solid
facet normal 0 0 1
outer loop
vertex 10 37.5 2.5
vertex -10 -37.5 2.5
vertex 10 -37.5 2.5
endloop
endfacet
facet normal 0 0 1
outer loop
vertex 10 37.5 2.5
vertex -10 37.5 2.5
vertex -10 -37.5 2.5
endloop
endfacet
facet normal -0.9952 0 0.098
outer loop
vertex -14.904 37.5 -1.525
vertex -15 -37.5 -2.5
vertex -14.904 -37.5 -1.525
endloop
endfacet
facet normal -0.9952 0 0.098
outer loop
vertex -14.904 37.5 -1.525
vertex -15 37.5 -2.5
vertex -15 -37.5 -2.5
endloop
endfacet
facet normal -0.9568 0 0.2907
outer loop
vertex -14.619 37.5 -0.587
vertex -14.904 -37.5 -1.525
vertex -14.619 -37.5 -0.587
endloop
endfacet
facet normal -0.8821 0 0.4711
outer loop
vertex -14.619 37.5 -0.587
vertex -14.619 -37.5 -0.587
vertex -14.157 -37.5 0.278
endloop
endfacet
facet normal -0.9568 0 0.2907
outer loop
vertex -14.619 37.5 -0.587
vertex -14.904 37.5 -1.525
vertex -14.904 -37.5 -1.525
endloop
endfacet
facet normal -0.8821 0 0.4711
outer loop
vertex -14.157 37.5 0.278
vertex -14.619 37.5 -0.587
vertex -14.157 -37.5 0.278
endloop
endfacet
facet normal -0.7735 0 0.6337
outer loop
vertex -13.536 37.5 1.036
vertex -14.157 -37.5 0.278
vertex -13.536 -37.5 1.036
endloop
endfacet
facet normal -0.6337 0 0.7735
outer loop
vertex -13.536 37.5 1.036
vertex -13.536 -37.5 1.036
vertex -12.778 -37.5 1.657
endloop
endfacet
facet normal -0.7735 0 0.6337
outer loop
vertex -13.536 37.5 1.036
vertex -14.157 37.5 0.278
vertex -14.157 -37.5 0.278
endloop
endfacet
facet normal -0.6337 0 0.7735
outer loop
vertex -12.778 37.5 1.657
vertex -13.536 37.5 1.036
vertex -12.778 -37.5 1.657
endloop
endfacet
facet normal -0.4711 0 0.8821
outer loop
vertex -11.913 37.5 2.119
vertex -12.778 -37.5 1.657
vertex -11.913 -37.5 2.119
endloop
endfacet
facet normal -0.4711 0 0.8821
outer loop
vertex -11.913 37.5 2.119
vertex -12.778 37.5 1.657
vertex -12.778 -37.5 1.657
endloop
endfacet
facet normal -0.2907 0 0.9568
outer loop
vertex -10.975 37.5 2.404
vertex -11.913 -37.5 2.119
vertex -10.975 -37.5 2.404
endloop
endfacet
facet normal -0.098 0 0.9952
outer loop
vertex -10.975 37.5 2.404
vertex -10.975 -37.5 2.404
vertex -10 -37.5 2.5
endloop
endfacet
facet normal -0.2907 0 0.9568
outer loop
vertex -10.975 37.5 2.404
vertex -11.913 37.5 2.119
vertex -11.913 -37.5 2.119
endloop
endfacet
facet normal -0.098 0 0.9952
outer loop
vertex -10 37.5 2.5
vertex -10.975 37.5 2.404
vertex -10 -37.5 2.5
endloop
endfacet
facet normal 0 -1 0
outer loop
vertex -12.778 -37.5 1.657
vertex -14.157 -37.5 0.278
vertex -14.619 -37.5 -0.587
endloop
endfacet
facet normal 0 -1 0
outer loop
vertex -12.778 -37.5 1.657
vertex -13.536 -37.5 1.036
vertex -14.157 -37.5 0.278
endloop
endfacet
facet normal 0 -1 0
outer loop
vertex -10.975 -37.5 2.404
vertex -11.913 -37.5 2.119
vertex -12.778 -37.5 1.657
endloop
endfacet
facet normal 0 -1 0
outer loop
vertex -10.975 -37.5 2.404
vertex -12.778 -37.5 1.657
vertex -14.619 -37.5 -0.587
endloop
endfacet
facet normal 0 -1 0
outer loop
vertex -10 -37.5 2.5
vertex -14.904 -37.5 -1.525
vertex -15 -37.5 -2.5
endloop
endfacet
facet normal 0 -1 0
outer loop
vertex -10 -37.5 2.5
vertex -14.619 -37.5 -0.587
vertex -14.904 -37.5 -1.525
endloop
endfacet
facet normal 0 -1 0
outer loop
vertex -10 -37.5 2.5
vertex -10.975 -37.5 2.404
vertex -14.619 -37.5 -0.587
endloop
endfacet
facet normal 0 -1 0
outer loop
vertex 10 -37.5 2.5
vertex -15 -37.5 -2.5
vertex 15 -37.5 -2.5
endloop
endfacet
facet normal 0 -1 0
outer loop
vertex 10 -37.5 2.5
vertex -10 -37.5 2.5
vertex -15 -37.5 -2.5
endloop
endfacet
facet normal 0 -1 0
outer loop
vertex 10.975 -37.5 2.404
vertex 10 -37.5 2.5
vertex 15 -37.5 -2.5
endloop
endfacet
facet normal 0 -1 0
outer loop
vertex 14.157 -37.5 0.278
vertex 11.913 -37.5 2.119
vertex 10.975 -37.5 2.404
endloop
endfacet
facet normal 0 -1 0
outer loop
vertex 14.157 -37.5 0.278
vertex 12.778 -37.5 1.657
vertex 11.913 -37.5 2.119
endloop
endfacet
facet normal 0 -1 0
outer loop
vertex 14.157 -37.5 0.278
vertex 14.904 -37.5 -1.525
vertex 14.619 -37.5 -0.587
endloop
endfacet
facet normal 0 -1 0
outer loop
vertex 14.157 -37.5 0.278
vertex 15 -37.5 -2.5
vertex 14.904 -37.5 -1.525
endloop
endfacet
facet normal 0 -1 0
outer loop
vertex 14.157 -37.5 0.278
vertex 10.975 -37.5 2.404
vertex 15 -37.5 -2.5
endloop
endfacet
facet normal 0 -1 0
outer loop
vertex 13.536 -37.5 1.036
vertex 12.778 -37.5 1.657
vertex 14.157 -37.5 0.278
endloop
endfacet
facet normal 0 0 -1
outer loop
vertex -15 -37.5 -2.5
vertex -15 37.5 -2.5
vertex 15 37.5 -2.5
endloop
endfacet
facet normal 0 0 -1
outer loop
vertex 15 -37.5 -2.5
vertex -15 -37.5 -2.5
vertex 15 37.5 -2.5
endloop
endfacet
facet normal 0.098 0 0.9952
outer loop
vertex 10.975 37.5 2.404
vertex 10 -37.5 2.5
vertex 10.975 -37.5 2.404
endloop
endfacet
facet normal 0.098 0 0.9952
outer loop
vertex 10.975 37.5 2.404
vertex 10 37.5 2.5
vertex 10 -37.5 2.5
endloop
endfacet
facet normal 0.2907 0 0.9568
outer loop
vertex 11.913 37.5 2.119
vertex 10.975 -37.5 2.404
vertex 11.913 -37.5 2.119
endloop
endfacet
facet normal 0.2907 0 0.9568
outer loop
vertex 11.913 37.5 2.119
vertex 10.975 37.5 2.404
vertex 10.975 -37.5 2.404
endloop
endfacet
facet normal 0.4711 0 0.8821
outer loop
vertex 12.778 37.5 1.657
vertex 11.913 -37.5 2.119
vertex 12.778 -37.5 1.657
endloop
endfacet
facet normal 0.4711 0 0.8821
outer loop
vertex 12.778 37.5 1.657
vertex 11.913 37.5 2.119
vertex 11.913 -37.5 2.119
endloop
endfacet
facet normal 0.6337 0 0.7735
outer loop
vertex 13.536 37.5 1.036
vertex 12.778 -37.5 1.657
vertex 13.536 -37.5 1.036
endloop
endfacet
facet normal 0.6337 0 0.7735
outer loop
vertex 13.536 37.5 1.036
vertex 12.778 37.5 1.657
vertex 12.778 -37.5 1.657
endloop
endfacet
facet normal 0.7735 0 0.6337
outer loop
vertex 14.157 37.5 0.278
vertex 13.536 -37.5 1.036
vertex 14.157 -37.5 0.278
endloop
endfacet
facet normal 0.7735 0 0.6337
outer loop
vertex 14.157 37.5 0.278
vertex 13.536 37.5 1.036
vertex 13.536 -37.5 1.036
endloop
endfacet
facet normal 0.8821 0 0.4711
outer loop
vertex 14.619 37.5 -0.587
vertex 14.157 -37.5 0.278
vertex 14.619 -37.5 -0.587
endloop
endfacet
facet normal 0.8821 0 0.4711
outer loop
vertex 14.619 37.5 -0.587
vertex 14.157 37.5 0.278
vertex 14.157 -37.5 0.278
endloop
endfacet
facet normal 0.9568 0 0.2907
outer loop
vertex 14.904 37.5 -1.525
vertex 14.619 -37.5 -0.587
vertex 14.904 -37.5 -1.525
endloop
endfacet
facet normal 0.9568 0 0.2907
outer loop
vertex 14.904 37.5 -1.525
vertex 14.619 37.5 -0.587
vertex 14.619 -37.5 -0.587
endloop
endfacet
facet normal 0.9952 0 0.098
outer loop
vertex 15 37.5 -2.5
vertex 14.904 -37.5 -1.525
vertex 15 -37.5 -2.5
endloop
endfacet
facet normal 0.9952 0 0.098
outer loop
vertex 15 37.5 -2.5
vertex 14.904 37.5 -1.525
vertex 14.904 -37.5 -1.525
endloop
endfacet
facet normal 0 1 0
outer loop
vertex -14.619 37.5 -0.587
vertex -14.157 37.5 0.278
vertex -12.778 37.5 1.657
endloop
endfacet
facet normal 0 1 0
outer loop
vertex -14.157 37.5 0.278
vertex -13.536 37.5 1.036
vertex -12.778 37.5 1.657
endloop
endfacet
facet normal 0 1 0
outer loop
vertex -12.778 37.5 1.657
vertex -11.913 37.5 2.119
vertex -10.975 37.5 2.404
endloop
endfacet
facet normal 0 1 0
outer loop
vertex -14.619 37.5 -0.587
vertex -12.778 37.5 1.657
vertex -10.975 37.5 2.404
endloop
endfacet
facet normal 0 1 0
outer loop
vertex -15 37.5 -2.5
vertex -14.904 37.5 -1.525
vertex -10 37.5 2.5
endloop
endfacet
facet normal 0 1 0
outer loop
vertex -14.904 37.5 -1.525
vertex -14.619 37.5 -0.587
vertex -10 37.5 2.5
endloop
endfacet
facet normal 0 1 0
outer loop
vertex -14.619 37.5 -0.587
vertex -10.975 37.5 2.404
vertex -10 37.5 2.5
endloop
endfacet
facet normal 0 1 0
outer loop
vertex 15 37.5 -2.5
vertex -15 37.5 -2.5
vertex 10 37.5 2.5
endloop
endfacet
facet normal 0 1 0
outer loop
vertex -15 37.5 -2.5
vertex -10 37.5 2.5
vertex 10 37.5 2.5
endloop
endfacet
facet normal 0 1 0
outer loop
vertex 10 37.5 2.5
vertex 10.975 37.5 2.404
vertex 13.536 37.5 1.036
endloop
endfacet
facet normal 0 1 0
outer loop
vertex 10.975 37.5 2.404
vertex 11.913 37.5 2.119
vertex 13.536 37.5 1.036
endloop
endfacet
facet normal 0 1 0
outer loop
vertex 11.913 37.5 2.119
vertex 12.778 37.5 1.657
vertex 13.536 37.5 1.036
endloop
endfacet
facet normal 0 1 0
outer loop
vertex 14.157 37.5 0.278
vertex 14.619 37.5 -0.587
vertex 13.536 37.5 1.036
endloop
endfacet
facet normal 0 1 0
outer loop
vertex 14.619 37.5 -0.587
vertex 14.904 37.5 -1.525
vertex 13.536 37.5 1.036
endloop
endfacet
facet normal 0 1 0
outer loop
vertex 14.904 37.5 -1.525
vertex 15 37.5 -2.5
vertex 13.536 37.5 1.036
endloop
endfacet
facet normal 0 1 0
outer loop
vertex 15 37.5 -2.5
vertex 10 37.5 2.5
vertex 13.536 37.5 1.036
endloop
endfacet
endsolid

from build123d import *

# Parameters (mm, degrees)
F0_W     = 30
F0_H     = 75
F1_DEPTH = 2.5
F2_R     = 4.99999


# Not quite as in the source:
# - a fillet or chamfer is up to 0.001 mm smaller than in the source, because OpenCascade refuses the exact size


with BuildPart() as f1:
    # F0 (on Top) → F1 (new body, symmetric)
    with BuildSketch(Plane.XY):
        Rectangle(F0_W, F0_H)
    extrude(amount=F1_DEPTH, both=True)

    # F2 (radius 5 in the source; OpenCascade refuses exactly that, so slightly less here)
    f2_edges = [f1.edges().sort_by_distance(p)[0] for p in [
        (15, 0, 2.5),
        (-15, 0, 2.5),
    ]]
    fillet(f2_edges, radius=F2_R)


solid = f1.part
